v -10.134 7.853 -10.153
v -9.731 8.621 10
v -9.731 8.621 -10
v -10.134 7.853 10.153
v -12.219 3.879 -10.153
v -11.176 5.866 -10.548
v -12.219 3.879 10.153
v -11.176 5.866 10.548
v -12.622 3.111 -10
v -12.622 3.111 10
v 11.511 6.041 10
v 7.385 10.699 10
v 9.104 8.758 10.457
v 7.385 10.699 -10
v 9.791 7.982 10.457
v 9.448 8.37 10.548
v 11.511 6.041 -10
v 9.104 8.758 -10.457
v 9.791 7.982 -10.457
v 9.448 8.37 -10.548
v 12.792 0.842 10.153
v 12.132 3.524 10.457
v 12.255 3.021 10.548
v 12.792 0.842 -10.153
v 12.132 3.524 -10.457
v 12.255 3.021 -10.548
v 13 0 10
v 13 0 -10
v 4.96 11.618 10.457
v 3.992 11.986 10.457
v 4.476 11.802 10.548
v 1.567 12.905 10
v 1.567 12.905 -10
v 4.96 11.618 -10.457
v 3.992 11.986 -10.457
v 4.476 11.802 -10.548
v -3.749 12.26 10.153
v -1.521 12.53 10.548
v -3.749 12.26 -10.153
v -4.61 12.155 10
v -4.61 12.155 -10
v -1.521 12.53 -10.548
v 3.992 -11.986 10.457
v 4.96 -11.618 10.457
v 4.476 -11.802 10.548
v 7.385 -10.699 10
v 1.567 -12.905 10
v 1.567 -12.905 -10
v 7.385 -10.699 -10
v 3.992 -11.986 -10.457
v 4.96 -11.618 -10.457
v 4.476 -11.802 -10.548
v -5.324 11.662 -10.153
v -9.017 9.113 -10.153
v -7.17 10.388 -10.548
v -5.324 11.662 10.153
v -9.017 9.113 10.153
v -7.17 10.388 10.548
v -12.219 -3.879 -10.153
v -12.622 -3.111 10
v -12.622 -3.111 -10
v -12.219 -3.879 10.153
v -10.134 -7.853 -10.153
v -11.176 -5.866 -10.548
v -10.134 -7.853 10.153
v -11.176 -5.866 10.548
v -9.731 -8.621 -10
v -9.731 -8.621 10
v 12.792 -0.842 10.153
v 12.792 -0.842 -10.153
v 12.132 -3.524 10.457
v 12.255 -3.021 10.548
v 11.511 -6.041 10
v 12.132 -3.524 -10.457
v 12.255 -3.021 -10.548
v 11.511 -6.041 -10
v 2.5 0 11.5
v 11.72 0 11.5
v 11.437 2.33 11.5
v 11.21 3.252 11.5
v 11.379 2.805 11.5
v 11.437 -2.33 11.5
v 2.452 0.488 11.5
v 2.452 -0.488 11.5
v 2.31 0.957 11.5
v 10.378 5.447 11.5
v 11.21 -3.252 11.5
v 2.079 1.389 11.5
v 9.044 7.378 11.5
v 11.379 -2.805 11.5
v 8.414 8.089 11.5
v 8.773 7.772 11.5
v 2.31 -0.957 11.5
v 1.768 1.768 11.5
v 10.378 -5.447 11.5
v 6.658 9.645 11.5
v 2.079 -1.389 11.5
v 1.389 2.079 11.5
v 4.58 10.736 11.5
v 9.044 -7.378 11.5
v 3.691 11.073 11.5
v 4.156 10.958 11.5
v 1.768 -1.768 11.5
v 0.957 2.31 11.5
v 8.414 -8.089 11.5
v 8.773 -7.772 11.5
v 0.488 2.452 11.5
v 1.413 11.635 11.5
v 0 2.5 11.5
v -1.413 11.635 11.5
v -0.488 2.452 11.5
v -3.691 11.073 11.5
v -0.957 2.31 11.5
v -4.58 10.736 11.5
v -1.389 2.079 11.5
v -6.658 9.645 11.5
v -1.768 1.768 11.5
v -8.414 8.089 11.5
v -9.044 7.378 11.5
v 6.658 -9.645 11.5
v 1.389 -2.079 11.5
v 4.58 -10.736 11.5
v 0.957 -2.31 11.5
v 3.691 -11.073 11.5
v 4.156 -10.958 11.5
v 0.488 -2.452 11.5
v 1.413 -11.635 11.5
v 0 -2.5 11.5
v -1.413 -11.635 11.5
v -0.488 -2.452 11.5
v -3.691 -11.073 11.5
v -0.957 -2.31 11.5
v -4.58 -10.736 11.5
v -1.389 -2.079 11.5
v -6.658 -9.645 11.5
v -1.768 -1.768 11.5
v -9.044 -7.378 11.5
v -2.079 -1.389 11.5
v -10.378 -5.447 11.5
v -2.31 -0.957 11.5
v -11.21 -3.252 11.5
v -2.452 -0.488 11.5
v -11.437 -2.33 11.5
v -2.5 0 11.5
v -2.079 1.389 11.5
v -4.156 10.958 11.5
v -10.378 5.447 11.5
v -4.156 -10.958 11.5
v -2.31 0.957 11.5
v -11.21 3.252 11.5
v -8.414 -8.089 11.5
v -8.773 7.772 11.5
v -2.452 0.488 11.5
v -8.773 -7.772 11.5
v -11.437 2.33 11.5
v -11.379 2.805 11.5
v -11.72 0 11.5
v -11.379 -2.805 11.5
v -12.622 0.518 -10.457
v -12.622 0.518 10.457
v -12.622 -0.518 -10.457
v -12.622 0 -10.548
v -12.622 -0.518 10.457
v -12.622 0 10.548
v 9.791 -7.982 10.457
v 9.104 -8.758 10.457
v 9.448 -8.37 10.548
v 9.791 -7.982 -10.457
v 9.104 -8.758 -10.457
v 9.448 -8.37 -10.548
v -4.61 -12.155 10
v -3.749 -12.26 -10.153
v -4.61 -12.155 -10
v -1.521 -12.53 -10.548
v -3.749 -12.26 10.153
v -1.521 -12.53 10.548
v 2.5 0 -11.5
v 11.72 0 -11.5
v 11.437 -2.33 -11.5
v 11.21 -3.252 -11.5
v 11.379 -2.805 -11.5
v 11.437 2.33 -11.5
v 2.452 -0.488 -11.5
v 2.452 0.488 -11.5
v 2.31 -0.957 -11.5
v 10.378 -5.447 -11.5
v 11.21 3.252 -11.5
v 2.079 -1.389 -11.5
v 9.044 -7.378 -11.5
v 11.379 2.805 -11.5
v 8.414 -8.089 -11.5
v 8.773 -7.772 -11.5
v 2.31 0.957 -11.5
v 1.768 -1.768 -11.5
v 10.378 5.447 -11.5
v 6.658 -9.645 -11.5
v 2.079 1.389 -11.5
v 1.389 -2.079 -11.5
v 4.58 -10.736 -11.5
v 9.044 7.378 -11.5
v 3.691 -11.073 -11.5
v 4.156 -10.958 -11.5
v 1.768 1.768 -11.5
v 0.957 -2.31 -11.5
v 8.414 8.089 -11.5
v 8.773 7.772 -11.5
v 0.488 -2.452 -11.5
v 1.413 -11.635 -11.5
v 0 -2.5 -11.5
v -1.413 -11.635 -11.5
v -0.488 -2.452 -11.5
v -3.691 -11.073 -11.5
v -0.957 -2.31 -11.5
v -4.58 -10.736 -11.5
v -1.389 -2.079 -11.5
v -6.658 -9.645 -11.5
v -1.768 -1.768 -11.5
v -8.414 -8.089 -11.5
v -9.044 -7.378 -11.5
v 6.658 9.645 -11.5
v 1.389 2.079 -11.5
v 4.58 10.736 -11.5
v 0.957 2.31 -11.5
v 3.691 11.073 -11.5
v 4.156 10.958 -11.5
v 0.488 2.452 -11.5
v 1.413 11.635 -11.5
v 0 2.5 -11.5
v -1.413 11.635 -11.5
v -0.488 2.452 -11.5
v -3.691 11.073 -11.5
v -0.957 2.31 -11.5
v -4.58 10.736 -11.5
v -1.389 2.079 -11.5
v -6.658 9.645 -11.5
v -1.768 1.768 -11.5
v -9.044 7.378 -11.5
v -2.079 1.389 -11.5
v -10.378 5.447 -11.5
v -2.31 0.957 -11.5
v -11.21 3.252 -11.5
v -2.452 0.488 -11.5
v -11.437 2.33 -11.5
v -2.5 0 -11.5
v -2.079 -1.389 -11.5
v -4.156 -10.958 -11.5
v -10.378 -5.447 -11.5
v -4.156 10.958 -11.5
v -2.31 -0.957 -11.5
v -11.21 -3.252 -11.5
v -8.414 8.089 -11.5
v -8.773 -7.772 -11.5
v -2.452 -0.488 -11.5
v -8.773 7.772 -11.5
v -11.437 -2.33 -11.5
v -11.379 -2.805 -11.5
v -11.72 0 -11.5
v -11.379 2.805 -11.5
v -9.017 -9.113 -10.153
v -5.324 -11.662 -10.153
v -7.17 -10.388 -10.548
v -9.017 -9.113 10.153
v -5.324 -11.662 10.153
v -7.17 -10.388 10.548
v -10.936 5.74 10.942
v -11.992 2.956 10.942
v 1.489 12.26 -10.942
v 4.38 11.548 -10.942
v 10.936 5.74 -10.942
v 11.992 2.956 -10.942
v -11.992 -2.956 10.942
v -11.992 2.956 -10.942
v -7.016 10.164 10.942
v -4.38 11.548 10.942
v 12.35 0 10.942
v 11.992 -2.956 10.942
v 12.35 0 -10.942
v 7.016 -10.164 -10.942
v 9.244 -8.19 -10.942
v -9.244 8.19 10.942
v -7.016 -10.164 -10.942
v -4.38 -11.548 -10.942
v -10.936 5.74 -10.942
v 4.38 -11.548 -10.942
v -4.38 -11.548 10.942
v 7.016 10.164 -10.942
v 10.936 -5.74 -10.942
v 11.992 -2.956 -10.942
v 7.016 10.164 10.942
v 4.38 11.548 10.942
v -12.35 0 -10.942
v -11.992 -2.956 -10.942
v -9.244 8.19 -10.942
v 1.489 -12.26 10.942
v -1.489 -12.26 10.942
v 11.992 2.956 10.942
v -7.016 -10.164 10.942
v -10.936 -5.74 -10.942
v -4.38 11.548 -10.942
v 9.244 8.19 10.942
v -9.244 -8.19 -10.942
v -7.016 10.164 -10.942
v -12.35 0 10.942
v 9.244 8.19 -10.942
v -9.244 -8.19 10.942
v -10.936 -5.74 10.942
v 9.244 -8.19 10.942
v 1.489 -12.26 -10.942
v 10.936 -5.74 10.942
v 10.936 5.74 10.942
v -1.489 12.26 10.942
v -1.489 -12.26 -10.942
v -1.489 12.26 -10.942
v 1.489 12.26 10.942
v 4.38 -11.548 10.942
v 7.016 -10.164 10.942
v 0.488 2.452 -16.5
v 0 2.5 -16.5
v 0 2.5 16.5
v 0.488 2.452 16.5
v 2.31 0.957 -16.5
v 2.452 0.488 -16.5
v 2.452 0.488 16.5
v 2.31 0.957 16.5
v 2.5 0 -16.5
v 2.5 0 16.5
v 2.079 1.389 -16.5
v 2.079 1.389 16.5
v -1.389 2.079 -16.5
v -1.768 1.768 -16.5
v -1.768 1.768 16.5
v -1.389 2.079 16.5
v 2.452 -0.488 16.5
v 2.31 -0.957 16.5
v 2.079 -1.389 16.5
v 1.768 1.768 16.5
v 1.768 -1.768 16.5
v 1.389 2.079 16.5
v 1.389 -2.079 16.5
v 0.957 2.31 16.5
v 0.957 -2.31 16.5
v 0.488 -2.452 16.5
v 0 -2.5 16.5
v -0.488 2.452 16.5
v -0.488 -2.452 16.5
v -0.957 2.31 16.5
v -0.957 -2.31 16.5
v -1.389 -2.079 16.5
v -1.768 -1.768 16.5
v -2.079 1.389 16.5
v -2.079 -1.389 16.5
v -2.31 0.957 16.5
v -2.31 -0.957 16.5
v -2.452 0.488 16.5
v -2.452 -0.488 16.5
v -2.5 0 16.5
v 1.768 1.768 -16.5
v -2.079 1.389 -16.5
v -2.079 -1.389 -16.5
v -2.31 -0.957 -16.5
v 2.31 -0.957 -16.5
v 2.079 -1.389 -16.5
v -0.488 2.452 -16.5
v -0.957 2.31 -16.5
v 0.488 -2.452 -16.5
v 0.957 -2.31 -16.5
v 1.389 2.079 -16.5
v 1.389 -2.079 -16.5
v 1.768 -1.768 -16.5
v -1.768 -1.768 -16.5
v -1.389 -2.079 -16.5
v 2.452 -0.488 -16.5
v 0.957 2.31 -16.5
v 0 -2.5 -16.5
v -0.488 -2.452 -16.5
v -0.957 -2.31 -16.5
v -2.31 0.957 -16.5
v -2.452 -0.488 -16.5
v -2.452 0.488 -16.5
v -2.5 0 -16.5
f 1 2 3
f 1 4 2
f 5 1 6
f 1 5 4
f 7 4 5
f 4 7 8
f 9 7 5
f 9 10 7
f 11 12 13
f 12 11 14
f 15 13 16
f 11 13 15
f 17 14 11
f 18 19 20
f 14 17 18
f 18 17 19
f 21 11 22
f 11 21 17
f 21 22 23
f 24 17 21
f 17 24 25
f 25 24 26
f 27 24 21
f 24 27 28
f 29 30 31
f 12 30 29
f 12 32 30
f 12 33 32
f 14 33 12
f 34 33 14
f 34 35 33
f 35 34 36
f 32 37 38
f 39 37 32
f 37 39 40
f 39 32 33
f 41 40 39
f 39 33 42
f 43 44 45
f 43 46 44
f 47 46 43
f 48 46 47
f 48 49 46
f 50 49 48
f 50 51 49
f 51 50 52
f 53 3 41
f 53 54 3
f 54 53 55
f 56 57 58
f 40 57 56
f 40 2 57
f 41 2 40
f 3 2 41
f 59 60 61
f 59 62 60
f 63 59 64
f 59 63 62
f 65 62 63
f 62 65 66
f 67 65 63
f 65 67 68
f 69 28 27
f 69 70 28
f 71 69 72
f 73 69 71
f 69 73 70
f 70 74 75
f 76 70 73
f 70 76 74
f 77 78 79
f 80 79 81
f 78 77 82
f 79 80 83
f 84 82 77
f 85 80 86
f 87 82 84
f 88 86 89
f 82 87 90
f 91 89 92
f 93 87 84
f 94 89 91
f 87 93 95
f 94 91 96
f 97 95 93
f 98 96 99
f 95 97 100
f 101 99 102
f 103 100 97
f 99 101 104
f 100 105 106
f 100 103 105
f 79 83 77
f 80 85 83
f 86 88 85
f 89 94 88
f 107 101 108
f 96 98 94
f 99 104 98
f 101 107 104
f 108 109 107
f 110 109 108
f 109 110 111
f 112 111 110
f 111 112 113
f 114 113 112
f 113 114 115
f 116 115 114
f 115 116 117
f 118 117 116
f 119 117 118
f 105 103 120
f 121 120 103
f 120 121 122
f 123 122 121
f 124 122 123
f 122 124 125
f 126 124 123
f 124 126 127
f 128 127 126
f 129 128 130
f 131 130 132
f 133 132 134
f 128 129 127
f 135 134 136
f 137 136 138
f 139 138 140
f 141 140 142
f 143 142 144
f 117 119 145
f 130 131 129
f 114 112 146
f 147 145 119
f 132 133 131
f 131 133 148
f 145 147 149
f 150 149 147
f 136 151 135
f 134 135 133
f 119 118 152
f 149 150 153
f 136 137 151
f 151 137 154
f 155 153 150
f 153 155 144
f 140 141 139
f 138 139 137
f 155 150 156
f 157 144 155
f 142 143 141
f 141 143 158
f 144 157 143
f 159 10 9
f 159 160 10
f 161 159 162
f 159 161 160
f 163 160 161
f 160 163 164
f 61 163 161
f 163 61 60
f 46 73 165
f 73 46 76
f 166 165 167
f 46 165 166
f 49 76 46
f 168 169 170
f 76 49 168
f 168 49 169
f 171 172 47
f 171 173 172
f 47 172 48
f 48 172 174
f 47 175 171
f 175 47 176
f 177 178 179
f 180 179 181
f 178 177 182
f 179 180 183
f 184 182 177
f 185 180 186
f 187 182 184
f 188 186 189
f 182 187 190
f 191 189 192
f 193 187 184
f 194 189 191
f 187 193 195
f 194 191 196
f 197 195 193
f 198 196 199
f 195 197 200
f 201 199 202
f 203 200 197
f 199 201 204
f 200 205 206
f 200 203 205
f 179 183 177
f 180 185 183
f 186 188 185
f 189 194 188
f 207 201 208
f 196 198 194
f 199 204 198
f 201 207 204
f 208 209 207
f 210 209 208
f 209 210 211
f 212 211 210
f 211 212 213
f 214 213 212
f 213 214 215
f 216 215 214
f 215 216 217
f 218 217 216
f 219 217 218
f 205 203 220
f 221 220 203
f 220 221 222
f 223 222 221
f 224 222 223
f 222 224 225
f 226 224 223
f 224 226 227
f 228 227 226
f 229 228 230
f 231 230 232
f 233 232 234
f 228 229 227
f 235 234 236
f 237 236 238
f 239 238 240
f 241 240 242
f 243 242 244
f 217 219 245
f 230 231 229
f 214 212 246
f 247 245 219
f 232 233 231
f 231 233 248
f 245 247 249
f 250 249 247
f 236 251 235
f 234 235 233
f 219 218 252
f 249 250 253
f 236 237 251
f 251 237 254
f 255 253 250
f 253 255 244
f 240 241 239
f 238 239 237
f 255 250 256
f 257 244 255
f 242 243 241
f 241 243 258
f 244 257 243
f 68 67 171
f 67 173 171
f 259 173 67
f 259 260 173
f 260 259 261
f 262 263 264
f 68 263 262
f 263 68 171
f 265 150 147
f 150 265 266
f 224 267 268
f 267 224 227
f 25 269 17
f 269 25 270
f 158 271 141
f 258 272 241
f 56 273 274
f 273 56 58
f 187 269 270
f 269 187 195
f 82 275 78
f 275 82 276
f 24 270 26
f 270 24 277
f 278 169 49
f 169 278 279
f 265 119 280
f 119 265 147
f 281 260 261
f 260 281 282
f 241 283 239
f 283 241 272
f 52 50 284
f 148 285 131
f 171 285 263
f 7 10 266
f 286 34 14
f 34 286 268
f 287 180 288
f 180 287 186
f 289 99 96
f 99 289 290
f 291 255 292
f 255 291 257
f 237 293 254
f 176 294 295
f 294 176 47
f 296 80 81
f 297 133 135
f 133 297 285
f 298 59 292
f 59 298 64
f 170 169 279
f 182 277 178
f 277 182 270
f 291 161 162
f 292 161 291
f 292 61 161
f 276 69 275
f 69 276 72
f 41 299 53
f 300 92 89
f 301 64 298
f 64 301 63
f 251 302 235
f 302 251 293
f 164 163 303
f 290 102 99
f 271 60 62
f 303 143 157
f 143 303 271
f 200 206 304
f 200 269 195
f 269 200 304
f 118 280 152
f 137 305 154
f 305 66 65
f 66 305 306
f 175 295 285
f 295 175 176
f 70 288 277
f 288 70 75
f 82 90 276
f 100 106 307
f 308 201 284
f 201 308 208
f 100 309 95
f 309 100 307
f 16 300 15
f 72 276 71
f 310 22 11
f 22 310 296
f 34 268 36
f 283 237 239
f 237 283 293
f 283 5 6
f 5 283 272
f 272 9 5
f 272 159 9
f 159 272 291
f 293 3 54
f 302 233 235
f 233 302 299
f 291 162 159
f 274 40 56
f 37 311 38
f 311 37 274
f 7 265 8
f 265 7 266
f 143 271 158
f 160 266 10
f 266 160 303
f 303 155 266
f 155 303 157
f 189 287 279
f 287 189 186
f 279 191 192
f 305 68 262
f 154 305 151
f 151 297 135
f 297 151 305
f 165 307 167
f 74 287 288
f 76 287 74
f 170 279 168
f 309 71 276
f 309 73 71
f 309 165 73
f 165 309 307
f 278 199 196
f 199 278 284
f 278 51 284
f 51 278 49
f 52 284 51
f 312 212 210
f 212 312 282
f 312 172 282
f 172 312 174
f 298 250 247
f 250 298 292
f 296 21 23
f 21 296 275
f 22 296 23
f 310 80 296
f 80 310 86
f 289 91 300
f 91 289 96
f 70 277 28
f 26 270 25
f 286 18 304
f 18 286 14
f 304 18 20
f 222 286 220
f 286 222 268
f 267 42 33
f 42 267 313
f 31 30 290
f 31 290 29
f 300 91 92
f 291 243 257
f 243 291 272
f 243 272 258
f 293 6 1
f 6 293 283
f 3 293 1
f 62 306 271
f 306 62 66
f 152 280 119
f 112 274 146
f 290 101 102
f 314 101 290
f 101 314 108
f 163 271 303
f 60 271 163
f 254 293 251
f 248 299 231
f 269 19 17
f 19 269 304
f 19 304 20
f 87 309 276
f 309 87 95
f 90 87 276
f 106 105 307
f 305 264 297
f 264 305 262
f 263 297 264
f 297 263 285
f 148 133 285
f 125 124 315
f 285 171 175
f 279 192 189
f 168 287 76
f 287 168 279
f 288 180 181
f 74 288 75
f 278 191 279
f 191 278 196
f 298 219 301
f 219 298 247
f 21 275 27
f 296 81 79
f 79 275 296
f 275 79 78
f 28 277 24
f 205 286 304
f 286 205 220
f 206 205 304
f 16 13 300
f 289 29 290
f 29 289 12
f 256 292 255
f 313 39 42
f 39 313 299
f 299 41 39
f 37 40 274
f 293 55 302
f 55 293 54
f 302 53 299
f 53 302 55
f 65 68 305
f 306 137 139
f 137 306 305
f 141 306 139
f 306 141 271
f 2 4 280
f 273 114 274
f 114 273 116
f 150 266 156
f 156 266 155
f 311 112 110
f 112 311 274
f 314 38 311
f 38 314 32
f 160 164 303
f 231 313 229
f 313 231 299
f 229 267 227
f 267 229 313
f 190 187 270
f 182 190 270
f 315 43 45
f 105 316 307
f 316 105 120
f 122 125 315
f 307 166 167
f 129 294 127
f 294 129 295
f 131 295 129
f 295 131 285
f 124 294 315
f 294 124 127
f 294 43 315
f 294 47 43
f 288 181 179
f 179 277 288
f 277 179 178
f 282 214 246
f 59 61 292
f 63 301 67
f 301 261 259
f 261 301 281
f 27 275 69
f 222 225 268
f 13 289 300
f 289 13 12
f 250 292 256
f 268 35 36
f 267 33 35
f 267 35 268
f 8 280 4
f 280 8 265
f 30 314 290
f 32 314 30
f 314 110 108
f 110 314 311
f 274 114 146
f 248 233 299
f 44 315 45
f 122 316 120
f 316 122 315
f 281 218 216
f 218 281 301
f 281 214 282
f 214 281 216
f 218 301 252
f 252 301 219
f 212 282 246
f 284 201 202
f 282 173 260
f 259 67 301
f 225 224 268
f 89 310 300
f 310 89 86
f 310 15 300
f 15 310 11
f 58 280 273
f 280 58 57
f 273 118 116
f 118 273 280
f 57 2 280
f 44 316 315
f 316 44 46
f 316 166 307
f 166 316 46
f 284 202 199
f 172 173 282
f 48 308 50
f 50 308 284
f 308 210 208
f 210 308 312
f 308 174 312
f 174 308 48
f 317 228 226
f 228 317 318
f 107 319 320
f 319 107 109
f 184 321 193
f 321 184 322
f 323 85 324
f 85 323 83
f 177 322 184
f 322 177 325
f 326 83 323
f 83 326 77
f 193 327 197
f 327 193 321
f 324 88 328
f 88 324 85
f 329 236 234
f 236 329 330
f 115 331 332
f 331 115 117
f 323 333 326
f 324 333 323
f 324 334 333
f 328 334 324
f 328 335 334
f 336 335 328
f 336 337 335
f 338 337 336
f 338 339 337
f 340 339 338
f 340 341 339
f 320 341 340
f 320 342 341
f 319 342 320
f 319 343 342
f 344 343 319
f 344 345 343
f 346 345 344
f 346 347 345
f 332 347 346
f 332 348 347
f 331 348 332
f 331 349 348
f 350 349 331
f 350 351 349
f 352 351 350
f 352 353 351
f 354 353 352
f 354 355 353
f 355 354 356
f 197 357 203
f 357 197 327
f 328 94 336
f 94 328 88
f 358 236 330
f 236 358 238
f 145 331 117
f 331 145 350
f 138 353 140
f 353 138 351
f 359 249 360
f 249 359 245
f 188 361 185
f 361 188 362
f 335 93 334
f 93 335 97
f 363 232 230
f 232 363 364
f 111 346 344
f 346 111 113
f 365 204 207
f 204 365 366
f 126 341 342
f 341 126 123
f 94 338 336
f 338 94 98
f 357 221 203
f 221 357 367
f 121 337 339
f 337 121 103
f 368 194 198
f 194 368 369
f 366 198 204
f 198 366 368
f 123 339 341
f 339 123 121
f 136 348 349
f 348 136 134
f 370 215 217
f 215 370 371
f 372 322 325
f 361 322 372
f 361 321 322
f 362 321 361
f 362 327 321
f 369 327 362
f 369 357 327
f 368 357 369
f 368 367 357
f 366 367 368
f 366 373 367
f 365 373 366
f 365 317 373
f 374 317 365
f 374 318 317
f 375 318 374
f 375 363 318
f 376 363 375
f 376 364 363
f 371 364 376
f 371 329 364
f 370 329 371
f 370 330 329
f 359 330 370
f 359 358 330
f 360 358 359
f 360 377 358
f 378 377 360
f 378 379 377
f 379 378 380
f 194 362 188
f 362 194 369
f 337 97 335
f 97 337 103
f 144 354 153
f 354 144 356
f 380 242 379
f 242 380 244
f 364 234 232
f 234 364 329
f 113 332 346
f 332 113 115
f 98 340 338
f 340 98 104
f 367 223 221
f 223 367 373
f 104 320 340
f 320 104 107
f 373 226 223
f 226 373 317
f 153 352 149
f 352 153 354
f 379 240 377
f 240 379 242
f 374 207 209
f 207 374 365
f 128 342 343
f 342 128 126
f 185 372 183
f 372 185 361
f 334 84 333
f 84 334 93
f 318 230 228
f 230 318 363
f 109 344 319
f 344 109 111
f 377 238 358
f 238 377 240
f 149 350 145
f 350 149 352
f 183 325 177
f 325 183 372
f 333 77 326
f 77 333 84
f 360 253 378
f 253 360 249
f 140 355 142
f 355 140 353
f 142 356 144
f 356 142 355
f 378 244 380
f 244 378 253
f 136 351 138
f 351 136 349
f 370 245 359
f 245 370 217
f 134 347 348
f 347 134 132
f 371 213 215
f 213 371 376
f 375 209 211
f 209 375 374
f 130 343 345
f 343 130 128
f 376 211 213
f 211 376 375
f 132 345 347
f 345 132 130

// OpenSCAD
// spool for sticky tape dispenser
// print sitting a little big diagonally, with support.

axd = 5;
axl = 33;
tid = 26;
inl = 23;

cylinder(h=axl, d=axd, center=true, $fn=32);

intersection() {
    cylinder(h=inl, d=tid, center=true, $fn=13);
    sphere(d=axl, $fn=26);
}
